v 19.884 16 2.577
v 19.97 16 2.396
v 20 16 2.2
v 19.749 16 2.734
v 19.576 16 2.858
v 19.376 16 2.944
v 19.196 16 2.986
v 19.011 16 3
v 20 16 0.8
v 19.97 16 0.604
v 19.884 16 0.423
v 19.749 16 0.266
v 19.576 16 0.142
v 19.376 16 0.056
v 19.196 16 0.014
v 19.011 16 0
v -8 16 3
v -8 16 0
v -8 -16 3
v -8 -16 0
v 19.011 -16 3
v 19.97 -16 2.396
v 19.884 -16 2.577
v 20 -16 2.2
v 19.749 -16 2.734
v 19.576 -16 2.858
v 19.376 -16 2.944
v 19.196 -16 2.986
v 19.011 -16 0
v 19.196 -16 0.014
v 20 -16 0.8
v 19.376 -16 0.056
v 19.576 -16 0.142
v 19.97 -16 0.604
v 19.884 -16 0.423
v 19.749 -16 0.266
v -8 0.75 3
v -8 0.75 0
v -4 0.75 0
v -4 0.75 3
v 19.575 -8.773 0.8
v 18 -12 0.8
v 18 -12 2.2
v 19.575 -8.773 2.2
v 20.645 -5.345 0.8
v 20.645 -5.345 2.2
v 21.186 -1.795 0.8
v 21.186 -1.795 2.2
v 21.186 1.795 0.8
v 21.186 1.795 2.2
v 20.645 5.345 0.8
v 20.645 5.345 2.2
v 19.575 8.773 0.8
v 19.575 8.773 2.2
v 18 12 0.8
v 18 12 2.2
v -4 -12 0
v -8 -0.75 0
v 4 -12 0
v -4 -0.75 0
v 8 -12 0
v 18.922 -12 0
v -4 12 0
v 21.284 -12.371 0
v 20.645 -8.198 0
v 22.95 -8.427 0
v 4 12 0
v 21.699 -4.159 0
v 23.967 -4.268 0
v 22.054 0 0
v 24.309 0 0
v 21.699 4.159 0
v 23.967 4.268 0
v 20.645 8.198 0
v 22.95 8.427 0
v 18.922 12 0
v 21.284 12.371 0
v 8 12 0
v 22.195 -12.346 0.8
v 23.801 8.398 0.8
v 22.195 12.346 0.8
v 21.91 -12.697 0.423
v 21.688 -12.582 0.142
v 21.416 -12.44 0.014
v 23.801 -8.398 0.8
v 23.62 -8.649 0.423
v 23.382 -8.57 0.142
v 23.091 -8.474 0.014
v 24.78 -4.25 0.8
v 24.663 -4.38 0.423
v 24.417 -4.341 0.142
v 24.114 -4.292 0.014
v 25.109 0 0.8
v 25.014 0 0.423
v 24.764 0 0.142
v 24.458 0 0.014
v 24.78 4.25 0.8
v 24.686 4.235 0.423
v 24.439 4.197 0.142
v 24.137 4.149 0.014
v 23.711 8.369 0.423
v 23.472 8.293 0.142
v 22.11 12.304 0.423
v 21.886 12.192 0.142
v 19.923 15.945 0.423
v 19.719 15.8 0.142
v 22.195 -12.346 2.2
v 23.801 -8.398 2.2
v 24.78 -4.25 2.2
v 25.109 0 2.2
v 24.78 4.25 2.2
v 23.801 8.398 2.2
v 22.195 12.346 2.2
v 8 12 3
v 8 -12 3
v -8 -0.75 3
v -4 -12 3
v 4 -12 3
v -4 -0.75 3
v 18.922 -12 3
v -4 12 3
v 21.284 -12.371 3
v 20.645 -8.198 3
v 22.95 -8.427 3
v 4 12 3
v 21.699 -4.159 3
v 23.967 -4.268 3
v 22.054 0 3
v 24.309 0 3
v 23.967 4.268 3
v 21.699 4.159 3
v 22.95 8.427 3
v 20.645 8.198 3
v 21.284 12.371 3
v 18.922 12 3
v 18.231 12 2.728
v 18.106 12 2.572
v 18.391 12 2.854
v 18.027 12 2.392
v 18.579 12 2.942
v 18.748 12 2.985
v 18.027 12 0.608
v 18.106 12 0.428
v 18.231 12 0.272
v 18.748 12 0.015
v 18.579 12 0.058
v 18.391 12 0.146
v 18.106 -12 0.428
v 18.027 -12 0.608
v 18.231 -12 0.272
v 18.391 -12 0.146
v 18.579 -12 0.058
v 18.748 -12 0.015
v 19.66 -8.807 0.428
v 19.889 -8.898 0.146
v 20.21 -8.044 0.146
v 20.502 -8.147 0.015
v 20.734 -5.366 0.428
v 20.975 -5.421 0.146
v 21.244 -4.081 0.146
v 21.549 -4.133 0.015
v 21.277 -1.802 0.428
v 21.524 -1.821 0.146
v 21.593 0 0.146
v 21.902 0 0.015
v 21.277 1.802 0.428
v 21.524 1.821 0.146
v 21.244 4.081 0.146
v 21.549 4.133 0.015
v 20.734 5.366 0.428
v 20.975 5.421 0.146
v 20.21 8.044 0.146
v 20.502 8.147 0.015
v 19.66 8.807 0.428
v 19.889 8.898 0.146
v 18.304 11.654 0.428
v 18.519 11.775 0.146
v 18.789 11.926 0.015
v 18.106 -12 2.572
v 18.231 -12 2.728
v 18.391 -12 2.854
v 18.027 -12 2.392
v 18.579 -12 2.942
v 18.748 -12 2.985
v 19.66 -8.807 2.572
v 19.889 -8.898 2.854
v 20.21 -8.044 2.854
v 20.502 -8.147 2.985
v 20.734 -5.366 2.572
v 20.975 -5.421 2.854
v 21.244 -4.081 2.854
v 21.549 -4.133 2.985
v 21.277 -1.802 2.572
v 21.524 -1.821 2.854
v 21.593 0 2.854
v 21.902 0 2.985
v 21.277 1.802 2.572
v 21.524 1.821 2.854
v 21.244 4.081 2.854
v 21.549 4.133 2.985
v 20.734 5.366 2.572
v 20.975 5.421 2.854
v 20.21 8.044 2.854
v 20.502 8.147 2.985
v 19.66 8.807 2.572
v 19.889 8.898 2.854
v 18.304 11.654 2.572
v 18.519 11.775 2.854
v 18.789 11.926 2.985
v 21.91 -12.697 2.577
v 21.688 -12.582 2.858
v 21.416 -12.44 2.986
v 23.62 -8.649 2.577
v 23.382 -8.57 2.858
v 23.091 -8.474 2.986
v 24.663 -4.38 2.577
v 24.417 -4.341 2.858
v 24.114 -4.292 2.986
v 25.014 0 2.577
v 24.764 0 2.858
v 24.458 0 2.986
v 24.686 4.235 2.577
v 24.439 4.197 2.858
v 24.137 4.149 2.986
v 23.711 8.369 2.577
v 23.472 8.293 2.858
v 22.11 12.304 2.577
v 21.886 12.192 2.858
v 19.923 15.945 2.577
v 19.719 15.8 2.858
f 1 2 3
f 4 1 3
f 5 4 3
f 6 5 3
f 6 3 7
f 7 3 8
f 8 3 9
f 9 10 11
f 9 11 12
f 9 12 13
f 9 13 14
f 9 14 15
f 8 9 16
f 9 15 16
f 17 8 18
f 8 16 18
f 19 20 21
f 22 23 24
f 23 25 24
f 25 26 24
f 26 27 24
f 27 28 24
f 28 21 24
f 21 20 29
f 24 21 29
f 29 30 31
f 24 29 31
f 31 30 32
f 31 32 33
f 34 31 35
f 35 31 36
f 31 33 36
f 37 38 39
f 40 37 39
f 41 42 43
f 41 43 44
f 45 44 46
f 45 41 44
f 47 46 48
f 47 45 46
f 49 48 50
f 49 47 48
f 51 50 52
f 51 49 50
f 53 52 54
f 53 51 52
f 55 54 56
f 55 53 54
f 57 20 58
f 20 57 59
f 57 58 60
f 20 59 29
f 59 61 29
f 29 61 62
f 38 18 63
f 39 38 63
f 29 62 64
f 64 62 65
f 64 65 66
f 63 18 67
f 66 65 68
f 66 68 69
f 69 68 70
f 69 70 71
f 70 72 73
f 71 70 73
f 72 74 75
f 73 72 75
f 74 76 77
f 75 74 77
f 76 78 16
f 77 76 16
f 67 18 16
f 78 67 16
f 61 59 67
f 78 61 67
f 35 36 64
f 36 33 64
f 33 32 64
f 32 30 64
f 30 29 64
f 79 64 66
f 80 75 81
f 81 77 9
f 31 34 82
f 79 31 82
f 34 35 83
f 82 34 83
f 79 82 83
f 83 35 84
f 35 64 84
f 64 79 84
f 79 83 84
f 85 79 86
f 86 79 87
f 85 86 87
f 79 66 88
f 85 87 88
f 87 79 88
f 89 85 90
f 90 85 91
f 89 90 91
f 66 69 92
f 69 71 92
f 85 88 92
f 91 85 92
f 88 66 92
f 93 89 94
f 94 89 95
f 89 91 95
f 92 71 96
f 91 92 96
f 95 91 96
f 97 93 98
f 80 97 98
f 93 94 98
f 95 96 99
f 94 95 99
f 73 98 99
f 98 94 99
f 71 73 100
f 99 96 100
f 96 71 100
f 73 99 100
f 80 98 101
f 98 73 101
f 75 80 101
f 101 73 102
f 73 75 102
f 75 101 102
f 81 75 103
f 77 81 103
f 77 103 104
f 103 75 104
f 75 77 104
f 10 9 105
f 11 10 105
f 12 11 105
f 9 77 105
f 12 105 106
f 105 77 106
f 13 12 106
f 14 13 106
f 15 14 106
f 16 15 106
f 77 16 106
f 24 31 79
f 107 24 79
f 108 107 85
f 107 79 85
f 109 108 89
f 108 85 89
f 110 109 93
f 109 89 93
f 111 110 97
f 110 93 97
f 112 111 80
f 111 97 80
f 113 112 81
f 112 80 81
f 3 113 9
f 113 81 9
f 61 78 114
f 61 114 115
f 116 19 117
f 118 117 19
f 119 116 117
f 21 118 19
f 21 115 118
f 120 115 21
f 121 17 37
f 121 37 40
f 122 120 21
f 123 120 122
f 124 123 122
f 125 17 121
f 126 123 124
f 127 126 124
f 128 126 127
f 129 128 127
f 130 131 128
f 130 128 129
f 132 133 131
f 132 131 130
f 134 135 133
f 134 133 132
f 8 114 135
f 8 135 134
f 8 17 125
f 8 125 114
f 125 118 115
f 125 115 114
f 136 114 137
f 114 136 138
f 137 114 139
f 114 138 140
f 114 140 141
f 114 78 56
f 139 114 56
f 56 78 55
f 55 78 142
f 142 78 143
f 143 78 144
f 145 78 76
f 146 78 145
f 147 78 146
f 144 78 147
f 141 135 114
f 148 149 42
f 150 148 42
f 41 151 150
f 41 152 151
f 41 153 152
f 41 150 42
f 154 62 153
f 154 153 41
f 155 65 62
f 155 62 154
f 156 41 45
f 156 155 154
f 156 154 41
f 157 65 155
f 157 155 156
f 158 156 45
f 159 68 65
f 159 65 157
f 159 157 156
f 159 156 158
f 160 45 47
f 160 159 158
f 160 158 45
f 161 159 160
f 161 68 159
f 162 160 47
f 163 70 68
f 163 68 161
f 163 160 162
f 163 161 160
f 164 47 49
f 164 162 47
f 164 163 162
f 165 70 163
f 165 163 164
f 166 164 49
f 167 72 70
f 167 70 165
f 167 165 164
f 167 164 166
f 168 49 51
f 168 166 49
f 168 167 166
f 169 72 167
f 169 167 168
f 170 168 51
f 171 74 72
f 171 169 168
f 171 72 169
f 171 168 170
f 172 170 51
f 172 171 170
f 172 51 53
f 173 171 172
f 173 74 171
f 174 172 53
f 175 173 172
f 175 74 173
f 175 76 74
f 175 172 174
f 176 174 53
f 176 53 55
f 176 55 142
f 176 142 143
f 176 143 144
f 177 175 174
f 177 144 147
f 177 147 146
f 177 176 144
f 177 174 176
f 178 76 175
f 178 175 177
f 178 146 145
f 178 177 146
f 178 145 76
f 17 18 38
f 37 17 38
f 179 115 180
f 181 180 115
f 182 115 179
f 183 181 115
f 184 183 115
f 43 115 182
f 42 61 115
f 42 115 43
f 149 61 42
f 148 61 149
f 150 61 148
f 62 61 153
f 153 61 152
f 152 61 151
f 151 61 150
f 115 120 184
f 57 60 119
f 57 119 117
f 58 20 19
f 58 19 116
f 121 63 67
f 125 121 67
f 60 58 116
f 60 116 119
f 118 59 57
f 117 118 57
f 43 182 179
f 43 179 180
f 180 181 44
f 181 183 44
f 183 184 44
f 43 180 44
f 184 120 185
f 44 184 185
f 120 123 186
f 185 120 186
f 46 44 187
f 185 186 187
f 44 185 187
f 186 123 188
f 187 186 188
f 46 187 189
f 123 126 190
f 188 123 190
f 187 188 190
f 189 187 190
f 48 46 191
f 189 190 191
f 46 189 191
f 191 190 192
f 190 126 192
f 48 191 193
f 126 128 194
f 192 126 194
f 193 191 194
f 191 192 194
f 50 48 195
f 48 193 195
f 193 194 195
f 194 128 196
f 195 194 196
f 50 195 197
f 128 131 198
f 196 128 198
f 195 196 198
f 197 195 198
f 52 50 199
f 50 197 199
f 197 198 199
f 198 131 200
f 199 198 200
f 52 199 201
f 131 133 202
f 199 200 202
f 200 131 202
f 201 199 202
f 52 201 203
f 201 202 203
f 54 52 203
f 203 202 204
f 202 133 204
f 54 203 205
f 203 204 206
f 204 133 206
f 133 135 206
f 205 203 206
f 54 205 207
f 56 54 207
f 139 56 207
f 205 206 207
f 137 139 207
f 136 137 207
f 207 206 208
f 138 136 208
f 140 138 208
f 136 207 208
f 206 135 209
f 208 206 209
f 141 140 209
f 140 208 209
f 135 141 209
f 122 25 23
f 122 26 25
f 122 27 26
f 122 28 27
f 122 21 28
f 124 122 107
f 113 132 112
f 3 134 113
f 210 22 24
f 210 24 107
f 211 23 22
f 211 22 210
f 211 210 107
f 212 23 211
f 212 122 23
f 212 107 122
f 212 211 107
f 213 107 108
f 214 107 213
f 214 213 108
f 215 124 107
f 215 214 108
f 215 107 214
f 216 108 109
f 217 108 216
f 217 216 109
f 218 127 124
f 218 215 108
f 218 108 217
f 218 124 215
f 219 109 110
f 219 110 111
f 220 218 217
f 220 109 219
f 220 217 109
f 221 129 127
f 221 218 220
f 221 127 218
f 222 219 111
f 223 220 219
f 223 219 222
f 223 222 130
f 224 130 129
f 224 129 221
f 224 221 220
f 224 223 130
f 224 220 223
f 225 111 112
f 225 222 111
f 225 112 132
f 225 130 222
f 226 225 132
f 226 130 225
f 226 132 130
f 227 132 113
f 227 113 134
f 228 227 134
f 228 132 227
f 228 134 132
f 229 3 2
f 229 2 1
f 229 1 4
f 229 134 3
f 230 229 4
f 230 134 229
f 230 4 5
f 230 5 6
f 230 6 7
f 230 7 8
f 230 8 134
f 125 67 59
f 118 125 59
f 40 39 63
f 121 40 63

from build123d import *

# Parameters (mm, degrees)
PAD_DEPTH = 3
FILLET_R  = 0.8


with BuildPart() as part:
    # Sketch → Pad (new body)
    with BuildSketch(Plane.XY):
        with BuildLine():
            Line((-4, 12), (4, 12))
            Line((4, 12), (4, -12))
            Line((4, -12), (-4, -12))
            Line((-4, -0.75), (-4, -12))
            Line((-8, -0.75), (-4, -0.75))
            Line((-8, -16), (-8, -0.75))
            Line((-8, -16), (20, -16))
            ThreePointArc((20, -16), (25.108875, 0), (20, 16))
            Line((20, 16), (-8, 16))
            Line((-8, 16), (-8, 0.75))
            Line((-8, 0.75), (-4, 0.75))
            Line((-4, 0.75), (-4, 12))
        make_face()
        with BuildLine():
            Line((8, 12), (8, -12))
            Line((8, -12), (18, -12))
            ThreePointArc((18, -12), (21.253947, 0), (18, 12))
            Line((8, 12), (18, 12))
        make_face(mode=Mode.SUBTRACT)
    extrude(amount=PAD_DEPTH)

    # Fillet
    fillet_edges = [part.edges().sort_by_distance(p)[0] for p in [
        (21.253947, 0, 3),
        (25.108875, 0, 3),
        (25.108875, 0, 0),
        (21.253947, 0, 0),
    ]]
    fillet(fillet_edges, radius=FILLET_R)


solid = part.part
